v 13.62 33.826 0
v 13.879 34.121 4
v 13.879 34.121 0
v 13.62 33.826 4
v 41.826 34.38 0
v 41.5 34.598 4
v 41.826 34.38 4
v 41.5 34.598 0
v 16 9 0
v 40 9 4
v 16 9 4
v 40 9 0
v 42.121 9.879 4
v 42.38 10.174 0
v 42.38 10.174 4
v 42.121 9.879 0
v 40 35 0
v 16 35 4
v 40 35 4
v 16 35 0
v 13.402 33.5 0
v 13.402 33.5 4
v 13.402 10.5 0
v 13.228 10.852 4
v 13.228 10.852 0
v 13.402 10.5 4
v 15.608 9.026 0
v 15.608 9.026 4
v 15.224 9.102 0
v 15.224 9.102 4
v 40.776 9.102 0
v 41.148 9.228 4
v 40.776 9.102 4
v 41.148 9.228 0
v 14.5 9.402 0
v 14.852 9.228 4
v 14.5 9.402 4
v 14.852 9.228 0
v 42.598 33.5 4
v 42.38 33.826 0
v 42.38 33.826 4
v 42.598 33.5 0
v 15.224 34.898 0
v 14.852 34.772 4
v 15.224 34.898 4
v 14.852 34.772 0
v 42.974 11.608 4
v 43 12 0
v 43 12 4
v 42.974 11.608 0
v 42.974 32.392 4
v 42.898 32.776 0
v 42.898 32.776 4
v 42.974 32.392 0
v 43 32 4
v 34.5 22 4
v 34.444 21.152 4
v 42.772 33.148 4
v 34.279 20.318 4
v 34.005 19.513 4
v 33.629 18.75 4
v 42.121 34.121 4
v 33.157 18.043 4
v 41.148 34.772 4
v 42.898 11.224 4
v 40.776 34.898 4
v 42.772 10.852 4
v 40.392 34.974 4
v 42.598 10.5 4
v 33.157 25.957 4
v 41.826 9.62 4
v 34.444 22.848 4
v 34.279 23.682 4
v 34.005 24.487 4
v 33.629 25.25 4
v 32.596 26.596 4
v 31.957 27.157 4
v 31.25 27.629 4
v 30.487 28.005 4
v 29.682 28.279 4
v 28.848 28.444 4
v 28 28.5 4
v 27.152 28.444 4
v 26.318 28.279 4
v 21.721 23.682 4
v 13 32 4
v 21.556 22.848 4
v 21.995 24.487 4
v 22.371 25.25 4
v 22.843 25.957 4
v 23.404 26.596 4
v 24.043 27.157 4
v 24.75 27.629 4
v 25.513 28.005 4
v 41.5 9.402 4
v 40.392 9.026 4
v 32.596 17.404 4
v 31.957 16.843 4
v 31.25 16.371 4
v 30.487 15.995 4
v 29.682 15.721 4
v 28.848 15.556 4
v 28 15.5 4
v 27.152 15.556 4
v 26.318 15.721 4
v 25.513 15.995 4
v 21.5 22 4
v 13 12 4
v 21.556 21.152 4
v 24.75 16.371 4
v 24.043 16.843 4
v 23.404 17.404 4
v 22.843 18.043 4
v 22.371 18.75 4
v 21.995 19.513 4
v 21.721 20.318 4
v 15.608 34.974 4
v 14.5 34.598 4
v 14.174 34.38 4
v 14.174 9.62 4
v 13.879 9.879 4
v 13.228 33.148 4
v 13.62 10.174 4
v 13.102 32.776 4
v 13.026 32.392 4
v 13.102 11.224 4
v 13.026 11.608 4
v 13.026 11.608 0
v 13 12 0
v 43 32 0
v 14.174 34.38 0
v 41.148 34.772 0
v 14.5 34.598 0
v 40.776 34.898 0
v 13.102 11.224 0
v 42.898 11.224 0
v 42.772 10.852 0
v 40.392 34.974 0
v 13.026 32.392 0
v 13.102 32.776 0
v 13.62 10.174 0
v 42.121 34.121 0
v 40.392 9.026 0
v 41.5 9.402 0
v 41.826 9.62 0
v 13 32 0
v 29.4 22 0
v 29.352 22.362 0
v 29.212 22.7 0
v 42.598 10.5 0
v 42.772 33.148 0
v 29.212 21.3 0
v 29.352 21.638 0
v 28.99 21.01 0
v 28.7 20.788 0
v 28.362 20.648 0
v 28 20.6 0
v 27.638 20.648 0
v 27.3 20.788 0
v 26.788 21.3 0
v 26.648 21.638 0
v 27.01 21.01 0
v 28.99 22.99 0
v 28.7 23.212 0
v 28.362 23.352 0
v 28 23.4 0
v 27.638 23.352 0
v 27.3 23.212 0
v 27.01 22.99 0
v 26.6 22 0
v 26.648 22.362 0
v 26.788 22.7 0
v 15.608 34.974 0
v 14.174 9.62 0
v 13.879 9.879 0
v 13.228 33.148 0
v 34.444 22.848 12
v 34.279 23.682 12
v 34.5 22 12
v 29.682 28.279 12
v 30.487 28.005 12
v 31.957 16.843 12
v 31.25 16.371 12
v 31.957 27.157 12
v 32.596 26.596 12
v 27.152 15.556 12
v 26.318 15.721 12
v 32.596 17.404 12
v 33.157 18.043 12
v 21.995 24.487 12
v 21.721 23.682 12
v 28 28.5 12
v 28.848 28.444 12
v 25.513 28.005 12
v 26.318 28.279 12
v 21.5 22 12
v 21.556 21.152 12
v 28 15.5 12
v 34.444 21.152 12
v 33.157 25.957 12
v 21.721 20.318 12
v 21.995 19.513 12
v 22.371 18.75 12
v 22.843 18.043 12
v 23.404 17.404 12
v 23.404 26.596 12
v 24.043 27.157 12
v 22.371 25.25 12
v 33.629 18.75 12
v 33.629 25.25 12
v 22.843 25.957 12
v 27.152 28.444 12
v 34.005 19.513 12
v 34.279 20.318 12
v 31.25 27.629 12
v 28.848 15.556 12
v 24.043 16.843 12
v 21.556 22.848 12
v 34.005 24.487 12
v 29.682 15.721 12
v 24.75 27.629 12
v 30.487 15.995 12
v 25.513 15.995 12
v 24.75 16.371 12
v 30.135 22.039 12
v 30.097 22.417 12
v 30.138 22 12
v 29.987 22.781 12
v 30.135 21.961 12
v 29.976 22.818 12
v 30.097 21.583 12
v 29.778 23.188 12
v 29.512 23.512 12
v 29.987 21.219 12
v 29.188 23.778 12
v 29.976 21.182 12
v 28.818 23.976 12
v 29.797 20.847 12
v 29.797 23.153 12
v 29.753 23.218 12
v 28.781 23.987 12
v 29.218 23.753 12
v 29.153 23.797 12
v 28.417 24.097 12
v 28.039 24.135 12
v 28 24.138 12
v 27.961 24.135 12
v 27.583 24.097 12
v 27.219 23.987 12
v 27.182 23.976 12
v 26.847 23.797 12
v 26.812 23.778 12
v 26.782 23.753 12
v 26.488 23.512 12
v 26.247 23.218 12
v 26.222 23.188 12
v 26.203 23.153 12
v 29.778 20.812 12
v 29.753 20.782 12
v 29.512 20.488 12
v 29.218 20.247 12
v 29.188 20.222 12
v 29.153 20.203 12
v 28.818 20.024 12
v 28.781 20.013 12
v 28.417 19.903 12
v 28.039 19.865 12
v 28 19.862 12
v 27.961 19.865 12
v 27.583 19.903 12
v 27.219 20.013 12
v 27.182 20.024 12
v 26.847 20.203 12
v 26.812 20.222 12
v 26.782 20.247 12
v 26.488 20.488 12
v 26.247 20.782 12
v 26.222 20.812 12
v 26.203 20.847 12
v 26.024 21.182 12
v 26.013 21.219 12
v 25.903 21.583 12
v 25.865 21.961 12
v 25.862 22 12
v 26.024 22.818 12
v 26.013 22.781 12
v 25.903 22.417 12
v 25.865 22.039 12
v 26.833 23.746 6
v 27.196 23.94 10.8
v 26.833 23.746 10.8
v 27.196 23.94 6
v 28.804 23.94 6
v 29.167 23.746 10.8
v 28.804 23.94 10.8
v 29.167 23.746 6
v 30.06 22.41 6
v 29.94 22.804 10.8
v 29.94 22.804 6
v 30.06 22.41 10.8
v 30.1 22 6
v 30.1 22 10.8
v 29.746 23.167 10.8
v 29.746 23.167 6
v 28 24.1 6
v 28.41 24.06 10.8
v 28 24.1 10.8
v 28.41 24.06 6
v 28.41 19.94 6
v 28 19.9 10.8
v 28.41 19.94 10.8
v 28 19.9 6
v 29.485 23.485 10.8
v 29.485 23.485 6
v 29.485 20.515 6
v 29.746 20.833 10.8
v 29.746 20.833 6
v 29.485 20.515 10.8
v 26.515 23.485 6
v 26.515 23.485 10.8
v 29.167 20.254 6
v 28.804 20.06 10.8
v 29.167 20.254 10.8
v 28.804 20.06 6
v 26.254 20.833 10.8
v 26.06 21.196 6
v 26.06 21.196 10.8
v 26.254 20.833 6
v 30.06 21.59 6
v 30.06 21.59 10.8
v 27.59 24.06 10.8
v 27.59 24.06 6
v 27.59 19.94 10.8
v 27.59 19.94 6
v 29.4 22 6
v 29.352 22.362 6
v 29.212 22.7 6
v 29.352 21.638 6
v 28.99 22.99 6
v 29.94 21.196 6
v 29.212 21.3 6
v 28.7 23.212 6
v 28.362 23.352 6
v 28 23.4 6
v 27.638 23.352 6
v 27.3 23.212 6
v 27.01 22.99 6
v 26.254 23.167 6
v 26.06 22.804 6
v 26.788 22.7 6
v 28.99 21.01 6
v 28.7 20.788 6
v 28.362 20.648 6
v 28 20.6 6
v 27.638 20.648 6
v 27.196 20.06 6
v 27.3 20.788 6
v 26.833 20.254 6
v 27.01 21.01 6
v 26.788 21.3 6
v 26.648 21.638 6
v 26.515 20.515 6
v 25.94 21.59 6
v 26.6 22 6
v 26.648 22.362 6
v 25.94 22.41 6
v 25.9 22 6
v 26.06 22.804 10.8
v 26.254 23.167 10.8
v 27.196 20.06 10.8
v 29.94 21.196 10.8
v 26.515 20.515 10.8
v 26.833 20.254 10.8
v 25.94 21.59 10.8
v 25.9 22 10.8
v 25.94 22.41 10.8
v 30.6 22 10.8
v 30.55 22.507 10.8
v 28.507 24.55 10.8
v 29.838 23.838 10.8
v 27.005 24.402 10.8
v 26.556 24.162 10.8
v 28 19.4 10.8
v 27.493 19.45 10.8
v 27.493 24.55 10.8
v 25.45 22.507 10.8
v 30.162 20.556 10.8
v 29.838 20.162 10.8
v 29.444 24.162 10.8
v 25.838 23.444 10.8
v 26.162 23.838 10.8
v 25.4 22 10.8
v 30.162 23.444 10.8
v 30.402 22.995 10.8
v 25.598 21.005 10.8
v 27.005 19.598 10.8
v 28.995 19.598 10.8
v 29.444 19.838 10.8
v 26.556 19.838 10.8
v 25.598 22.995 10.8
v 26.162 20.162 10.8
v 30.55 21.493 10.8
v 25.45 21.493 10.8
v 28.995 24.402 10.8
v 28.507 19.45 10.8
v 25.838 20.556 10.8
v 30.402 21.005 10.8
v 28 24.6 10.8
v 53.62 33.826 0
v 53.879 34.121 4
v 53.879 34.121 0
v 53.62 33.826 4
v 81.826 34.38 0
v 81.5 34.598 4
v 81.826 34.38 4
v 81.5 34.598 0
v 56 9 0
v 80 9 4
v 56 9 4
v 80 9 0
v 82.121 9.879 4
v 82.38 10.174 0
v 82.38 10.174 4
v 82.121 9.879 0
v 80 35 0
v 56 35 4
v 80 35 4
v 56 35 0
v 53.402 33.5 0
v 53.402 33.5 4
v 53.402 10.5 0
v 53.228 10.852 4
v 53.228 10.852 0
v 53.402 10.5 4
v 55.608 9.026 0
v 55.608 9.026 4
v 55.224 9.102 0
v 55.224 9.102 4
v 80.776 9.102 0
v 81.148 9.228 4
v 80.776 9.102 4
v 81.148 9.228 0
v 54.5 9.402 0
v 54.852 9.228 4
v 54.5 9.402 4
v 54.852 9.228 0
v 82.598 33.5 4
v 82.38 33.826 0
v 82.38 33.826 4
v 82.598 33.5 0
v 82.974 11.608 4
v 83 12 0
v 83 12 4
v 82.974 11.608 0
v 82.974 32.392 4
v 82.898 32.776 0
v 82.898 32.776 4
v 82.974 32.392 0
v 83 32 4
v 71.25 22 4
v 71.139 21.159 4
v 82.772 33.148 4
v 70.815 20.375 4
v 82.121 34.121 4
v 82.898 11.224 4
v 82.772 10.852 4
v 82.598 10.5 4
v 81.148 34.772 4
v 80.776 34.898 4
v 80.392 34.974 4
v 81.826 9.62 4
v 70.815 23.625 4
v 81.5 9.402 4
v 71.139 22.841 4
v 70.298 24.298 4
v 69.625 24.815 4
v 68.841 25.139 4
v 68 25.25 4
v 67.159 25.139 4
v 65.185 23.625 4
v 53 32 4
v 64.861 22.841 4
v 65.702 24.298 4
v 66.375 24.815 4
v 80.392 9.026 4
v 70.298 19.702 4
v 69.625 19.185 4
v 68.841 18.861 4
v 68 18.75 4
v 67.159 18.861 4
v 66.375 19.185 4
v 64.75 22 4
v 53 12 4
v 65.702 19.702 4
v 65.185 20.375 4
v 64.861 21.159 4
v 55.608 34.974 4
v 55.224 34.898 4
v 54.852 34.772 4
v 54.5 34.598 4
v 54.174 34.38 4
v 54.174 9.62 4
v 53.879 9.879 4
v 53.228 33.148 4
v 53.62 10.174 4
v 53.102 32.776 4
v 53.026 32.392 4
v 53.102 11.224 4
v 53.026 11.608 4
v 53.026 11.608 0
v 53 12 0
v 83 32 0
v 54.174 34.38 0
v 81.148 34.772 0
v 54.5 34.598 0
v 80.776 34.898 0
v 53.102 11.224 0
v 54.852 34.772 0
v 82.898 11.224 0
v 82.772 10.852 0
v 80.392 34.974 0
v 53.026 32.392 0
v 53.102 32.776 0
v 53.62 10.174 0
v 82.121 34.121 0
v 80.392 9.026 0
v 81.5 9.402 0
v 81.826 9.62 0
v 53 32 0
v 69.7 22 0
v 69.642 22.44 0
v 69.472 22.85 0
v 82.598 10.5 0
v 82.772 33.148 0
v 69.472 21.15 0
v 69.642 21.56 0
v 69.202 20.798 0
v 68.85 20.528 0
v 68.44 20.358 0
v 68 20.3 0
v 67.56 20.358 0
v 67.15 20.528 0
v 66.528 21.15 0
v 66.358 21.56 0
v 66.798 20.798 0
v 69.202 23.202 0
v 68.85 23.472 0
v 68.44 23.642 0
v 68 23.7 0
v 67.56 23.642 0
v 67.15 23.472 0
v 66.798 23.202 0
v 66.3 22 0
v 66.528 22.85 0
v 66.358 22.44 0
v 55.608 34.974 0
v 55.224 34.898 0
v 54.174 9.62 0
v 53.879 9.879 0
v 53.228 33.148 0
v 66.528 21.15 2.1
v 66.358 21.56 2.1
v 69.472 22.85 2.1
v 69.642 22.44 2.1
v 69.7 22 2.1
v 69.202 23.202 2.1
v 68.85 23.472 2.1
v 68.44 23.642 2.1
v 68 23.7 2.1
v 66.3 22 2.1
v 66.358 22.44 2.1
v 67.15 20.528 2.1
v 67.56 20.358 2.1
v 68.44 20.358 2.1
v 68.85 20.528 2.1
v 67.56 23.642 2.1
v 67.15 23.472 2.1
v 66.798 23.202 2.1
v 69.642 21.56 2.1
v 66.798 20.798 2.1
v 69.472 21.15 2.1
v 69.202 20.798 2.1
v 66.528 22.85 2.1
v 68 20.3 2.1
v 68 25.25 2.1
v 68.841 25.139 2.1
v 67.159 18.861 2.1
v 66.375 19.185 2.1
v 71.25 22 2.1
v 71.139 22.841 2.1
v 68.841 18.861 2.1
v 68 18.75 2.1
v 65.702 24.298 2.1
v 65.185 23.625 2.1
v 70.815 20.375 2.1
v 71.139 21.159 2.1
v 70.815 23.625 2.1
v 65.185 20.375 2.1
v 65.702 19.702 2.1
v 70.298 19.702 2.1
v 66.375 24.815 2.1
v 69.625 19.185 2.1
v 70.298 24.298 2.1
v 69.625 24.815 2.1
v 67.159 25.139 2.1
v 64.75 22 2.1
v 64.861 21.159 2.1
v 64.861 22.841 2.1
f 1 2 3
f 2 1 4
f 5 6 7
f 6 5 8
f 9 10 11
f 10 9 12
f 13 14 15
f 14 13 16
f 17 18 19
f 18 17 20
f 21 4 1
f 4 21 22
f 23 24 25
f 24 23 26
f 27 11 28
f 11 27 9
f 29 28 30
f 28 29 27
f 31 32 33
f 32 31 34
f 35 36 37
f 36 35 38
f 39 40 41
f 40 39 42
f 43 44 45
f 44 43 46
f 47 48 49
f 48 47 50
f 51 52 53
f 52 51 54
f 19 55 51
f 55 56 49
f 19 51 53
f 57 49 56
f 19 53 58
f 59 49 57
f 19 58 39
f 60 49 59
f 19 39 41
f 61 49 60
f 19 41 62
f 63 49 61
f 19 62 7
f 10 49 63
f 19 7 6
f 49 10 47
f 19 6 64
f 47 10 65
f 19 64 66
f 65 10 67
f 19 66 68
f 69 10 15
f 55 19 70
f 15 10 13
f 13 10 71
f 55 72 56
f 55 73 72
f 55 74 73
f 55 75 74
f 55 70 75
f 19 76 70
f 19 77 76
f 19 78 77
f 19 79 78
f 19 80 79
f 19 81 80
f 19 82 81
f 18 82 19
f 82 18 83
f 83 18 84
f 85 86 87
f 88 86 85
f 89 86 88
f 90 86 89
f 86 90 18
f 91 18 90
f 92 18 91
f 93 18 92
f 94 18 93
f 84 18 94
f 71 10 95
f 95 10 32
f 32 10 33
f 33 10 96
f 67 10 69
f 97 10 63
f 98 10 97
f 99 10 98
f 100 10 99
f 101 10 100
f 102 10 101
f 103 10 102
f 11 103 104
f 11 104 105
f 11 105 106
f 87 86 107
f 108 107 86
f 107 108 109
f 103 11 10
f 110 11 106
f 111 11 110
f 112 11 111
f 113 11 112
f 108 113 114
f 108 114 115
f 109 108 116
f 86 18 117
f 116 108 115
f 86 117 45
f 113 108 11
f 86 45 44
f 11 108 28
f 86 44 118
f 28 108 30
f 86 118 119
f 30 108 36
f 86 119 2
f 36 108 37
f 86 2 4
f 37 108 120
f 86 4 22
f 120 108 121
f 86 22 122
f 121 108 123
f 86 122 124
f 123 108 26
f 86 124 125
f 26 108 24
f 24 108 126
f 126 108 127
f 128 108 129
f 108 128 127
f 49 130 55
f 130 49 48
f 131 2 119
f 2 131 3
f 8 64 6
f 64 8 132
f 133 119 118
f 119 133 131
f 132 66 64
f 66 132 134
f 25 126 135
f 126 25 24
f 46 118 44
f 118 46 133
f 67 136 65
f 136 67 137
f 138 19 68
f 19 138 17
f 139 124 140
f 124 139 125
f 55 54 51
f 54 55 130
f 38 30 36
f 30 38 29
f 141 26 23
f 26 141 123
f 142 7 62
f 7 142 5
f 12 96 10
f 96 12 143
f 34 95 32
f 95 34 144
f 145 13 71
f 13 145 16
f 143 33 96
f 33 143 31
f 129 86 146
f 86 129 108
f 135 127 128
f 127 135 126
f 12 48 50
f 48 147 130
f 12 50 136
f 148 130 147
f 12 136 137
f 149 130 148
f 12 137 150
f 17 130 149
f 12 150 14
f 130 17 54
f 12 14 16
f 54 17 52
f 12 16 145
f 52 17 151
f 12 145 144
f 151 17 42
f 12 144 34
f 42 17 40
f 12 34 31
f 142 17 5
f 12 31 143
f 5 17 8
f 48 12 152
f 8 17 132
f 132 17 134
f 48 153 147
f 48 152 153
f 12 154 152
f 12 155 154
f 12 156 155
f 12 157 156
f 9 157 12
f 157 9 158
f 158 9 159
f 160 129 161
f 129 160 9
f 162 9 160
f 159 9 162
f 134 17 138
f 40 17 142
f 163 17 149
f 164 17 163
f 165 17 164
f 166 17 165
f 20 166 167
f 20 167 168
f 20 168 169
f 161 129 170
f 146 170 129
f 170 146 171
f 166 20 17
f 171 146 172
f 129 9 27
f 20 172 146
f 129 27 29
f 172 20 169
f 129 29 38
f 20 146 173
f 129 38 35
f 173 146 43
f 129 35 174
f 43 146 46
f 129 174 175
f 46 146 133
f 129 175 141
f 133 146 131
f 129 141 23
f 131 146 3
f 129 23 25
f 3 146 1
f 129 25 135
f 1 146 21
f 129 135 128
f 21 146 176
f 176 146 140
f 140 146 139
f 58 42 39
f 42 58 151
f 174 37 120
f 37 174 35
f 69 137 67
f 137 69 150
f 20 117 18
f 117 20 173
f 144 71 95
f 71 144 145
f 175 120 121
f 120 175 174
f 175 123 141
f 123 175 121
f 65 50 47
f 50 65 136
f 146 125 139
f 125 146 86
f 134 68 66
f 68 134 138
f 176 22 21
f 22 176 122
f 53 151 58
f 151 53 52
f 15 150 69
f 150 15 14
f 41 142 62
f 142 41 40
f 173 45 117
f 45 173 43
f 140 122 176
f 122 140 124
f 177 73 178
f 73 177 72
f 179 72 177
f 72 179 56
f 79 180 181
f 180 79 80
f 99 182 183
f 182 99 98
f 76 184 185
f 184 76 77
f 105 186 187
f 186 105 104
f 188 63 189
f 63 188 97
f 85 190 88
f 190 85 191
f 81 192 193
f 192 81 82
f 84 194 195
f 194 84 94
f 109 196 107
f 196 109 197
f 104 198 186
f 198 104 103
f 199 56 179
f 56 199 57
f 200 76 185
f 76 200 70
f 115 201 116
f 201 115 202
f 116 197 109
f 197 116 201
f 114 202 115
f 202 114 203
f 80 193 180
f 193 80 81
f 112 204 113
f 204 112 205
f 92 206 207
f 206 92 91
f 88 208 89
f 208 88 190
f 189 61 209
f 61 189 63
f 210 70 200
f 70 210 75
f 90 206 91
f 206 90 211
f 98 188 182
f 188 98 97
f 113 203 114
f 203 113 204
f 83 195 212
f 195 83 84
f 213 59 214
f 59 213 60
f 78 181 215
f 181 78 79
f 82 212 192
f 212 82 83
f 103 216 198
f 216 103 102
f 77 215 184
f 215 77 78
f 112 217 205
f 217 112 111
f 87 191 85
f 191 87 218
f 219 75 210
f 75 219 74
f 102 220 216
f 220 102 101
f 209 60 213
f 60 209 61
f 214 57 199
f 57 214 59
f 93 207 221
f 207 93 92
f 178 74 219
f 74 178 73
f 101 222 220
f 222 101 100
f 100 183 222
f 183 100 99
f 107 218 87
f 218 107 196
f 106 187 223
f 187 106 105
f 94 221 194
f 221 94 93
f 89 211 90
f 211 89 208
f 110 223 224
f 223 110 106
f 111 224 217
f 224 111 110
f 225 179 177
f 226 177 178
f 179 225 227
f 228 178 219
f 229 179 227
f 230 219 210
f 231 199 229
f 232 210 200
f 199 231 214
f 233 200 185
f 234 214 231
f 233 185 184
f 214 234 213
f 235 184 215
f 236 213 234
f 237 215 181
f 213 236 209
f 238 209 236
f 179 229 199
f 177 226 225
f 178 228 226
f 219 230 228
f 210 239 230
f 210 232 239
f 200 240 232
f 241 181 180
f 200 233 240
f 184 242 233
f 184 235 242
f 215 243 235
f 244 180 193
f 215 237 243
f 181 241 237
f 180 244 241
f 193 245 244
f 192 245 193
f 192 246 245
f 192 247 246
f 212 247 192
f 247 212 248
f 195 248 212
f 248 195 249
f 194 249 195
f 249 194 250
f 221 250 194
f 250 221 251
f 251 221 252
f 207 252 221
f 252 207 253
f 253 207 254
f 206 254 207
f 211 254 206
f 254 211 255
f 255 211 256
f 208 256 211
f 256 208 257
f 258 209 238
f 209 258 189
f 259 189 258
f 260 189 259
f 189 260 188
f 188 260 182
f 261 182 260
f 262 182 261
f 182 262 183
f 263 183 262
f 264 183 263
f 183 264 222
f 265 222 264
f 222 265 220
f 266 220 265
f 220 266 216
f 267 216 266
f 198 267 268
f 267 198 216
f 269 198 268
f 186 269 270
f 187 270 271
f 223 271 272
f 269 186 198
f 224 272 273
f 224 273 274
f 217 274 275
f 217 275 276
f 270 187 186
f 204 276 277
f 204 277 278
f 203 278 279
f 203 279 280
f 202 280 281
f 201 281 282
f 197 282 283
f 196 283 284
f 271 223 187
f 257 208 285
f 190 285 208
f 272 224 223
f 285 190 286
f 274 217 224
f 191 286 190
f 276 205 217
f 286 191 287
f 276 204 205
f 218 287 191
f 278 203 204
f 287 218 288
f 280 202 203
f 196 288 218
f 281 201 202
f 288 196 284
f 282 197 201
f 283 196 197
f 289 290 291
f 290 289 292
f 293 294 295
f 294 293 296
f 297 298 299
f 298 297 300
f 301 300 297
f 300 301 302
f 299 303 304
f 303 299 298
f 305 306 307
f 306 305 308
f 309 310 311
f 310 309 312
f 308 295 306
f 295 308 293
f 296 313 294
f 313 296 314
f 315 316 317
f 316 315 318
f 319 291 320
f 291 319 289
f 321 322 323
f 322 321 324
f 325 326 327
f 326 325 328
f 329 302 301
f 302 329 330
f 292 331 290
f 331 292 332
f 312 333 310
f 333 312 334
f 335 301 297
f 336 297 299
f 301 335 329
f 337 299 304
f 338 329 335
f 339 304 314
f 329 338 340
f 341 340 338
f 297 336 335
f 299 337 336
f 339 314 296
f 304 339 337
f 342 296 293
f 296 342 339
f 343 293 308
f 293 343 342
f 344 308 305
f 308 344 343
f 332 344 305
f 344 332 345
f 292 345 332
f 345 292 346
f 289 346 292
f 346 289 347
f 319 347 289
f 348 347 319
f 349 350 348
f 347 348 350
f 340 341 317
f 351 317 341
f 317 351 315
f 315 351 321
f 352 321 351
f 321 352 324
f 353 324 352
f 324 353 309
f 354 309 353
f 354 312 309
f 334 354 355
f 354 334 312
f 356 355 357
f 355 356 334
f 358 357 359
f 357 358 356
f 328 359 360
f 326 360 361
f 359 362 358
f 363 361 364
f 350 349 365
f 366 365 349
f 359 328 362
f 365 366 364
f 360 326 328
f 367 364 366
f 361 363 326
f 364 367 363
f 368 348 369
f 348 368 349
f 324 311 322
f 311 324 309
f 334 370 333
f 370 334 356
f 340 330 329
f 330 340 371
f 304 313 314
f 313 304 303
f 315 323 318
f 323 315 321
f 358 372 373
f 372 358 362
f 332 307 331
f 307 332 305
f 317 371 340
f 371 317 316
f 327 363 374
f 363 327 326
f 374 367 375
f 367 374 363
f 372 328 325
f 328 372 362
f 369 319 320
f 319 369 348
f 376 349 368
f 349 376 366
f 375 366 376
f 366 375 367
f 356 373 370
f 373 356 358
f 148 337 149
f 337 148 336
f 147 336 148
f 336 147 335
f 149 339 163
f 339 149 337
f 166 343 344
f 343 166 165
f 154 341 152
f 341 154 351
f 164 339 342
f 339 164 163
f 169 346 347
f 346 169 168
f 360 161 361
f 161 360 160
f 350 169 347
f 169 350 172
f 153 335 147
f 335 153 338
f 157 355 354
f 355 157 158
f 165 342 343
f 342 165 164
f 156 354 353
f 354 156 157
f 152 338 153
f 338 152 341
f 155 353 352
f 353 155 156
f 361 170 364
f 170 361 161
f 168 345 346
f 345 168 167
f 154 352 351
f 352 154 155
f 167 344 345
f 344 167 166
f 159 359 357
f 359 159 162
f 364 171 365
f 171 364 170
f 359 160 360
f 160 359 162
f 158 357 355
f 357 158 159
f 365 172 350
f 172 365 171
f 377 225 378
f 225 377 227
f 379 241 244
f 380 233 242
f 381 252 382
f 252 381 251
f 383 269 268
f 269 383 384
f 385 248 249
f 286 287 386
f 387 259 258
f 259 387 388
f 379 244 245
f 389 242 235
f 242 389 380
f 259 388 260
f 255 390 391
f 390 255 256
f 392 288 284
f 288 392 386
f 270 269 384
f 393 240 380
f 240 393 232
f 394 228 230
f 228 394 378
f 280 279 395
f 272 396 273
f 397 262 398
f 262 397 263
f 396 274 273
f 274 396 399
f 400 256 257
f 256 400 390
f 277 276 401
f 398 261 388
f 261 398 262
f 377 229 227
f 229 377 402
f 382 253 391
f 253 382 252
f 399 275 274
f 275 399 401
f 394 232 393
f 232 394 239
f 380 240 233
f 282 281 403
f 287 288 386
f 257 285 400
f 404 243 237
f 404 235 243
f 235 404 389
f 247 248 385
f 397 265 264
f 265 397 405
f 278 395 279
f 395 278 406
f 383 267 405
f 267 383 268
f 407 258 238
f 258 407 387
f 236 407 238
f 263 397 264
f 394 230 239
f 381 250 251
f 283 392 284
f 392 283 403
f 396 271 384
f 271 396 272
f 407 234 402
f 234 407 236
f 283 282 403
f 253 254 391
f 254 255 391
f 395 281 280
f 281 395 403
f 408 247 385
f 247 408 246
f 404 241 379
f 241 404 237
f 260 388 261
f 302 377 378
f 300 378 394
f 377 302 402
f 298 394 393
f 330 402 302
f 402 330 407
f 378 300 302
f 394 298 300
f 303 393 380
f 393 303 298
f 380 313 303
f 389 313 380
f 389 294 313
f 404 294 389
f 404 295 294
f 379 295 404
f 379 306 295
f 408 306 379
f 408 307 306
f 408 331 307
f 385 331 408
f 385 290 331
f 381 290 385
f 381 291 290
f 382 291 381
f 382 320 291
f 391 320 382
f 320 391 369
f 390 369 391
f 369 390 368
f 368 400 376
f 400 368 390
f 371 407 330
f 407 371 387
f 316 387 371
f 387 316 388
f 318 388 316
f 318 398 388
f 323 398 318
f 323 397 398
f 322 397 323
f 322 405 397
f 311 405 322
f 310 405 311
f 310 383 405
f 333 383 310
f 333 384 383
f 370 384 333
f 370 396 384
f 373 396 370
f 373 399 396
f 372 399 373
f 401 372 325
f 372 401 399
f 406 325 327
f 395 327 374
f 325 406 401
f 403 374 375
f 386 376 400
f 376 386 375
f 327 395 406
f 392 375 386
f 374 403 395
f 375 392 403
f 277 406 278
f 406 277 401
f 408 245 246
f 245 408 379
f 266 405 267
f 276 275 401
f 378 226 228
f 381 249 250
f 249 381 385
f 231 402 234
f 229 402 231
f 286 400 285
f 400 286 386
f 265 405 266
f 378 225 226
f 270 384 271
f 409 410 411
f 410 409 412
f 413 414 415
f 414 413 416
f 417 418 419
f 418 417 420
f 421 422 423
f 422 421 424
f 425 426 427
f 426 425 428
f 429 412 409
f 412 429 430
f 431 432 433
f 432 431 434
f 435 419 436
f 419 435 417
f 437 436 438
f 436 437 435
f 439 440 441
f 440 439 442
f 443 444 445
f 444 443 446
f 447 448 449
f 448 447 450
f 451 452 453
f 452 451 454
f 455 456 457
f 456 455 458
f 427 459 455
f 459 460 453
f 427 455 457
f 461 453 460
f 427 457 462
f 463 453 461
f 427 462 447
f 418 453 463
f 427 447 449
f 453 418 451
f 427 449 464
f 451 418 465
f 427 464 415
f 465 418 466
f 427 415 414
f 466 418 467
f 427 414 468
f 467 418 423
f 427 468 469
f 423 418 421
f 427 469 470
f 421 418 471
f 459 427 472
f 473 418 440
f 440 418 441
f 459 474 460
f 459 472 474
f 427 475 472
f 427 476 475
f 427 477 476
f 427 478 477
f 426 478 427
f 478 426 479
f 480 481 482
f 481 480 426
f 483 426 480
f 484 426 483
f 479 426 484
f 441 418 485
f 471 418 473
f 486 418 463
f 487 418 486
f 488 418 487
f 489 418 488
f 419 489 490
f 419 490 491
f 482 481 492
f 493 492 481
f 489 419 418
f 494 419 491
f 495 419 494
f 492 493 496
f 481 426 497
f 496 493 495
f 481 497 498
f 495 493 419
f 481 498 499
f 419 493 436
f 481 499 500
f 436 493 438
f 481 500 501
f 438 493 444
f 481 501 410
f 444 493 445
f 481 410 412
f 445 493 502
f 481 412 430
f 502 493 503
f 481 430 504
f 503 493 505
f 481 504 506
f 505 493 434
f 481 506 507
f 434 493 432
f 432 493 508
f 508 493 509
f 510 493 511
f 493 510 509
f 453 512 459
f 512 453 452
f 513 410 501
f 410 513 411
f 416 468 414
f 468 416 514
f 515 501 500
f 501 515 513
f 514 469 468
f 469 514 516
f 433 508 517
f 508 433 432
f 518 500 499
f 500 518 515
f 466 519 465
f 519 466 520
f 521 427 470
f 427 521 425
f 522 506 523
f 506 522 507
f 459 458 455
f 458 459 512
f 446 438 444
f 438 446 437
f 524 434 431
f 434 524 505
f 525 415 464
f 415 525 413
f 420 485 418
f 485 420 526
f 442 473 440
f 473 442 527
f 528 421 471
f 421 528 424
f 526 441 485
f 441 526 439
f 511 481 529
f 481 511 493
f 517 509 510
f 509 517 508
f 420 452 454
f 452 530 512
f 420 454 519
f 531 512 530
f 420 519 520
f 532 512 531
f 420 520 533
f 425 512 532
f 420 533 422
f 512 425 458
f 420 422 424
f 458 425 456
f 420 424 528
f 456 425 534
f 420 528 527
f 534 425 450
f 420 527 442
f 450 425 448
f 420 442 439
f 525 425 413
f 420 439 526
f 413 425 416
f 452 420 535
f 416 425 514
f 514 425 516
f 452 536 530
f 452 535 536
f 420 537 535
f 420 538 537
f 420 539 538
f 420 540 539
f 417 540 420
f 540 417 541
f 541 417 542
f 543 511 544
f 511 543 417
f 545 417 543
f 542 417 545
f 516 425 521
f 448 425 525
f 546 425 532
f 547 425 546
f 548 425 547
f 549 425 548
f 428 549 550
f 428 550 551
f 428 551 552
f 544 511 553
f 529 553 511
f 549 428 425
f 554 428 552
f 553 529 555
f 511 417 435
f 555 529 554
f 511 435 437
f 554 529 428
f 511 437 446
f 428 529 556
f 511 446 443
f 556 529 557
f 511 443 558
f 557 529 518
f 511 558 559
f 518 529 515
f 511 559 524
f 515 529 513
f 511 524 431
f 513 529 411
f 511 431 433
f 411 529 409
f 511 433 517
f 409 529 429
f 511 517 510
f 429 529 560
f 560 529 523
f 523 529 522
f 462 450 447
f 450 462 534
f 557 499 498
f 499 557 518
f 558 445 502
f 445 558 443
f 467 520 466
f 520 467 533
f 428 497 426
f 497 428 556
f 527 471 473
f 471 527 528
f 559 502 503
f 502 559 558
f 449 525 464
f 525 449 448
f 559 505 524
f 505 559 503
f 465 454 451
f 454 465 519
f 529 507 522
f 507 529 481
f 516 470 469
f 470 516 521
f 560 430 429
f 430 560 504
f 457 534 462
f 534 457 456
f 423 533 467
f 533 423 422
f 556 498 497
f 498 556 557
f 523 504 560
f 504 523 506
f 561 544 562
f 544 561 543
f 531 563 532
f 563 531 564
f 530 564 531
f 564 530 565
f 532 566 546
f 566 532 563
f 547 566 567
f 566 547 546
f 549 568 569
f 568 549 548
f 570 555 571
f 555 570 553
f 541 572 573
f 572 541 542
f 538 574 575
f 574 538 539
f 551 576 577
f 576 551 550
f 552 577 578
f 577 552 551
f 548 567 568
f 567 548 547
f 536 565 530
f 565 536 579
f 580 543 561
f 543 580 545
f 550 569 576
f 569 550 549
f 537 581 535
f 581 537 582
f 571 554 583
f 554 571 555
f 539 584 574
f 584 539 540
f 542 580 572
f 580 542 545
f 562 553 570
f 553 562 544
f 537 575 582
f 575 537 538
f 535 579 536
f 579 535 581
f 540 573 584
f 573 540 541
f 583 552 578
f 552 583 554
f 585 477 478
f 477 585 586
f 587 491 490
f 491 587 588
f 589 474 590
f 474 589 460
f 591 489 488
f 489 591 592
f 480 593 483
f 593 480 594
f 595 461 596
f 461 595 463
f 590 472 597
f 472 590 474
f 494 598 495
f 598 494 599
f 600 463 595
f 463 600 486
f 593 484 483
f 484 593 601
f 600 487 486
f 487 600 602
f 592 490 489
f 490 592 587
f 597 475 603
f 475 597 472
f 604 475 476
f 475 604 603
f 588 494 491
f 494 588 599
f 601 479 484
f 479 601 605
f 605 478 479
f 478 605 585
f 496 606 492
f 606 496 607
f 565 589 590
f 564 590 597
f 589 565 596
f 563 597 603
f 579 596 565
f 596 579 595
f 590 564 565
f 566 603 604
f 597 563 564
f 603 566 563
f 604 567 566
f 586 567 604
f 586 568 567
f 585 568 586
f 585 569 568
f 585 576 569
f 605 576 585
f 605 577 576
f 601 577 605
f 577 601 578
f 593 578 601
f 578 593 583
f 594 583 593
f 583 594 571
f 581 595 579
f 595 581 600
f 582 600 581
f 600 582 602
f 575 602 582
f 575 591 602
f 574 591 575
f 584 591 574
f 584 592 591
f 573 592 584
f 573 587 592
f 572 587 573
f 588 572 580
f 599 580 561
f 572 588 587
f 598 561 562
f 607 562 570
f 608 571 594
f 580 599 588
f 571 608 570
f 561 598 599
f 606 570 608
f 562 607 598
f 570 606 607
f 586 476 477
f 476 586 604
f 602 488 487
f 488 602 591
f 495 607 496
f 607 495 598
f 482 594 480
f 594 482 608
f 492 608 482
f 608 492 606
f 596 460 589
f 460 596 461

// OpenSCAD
/*
Sample 063: Heizeinsatz-Schraubprobe — M3
Generated from the FDM Mechanical Sample Library.
Units: millimetres.

Override examples:
  openscad -o custom.stl -D 'view="plate"' -D 'render_fn=64' model.scad
  openscad -o preview.png -D 'view="assembly"' model.scad
*/
use <../../../library/fdm_mechanisms.scad>

render_fn = is_undef(render_fn) ? 48 : render_fn;
view = is_undef(view) ? "plate" : view;
$fn = render_fn;

sample_heatset_insert(
    view=view,
    pilot_d=4.2,
    screw_clear=3.4,
    head_d=6.5,
    insert_depth=6
);
